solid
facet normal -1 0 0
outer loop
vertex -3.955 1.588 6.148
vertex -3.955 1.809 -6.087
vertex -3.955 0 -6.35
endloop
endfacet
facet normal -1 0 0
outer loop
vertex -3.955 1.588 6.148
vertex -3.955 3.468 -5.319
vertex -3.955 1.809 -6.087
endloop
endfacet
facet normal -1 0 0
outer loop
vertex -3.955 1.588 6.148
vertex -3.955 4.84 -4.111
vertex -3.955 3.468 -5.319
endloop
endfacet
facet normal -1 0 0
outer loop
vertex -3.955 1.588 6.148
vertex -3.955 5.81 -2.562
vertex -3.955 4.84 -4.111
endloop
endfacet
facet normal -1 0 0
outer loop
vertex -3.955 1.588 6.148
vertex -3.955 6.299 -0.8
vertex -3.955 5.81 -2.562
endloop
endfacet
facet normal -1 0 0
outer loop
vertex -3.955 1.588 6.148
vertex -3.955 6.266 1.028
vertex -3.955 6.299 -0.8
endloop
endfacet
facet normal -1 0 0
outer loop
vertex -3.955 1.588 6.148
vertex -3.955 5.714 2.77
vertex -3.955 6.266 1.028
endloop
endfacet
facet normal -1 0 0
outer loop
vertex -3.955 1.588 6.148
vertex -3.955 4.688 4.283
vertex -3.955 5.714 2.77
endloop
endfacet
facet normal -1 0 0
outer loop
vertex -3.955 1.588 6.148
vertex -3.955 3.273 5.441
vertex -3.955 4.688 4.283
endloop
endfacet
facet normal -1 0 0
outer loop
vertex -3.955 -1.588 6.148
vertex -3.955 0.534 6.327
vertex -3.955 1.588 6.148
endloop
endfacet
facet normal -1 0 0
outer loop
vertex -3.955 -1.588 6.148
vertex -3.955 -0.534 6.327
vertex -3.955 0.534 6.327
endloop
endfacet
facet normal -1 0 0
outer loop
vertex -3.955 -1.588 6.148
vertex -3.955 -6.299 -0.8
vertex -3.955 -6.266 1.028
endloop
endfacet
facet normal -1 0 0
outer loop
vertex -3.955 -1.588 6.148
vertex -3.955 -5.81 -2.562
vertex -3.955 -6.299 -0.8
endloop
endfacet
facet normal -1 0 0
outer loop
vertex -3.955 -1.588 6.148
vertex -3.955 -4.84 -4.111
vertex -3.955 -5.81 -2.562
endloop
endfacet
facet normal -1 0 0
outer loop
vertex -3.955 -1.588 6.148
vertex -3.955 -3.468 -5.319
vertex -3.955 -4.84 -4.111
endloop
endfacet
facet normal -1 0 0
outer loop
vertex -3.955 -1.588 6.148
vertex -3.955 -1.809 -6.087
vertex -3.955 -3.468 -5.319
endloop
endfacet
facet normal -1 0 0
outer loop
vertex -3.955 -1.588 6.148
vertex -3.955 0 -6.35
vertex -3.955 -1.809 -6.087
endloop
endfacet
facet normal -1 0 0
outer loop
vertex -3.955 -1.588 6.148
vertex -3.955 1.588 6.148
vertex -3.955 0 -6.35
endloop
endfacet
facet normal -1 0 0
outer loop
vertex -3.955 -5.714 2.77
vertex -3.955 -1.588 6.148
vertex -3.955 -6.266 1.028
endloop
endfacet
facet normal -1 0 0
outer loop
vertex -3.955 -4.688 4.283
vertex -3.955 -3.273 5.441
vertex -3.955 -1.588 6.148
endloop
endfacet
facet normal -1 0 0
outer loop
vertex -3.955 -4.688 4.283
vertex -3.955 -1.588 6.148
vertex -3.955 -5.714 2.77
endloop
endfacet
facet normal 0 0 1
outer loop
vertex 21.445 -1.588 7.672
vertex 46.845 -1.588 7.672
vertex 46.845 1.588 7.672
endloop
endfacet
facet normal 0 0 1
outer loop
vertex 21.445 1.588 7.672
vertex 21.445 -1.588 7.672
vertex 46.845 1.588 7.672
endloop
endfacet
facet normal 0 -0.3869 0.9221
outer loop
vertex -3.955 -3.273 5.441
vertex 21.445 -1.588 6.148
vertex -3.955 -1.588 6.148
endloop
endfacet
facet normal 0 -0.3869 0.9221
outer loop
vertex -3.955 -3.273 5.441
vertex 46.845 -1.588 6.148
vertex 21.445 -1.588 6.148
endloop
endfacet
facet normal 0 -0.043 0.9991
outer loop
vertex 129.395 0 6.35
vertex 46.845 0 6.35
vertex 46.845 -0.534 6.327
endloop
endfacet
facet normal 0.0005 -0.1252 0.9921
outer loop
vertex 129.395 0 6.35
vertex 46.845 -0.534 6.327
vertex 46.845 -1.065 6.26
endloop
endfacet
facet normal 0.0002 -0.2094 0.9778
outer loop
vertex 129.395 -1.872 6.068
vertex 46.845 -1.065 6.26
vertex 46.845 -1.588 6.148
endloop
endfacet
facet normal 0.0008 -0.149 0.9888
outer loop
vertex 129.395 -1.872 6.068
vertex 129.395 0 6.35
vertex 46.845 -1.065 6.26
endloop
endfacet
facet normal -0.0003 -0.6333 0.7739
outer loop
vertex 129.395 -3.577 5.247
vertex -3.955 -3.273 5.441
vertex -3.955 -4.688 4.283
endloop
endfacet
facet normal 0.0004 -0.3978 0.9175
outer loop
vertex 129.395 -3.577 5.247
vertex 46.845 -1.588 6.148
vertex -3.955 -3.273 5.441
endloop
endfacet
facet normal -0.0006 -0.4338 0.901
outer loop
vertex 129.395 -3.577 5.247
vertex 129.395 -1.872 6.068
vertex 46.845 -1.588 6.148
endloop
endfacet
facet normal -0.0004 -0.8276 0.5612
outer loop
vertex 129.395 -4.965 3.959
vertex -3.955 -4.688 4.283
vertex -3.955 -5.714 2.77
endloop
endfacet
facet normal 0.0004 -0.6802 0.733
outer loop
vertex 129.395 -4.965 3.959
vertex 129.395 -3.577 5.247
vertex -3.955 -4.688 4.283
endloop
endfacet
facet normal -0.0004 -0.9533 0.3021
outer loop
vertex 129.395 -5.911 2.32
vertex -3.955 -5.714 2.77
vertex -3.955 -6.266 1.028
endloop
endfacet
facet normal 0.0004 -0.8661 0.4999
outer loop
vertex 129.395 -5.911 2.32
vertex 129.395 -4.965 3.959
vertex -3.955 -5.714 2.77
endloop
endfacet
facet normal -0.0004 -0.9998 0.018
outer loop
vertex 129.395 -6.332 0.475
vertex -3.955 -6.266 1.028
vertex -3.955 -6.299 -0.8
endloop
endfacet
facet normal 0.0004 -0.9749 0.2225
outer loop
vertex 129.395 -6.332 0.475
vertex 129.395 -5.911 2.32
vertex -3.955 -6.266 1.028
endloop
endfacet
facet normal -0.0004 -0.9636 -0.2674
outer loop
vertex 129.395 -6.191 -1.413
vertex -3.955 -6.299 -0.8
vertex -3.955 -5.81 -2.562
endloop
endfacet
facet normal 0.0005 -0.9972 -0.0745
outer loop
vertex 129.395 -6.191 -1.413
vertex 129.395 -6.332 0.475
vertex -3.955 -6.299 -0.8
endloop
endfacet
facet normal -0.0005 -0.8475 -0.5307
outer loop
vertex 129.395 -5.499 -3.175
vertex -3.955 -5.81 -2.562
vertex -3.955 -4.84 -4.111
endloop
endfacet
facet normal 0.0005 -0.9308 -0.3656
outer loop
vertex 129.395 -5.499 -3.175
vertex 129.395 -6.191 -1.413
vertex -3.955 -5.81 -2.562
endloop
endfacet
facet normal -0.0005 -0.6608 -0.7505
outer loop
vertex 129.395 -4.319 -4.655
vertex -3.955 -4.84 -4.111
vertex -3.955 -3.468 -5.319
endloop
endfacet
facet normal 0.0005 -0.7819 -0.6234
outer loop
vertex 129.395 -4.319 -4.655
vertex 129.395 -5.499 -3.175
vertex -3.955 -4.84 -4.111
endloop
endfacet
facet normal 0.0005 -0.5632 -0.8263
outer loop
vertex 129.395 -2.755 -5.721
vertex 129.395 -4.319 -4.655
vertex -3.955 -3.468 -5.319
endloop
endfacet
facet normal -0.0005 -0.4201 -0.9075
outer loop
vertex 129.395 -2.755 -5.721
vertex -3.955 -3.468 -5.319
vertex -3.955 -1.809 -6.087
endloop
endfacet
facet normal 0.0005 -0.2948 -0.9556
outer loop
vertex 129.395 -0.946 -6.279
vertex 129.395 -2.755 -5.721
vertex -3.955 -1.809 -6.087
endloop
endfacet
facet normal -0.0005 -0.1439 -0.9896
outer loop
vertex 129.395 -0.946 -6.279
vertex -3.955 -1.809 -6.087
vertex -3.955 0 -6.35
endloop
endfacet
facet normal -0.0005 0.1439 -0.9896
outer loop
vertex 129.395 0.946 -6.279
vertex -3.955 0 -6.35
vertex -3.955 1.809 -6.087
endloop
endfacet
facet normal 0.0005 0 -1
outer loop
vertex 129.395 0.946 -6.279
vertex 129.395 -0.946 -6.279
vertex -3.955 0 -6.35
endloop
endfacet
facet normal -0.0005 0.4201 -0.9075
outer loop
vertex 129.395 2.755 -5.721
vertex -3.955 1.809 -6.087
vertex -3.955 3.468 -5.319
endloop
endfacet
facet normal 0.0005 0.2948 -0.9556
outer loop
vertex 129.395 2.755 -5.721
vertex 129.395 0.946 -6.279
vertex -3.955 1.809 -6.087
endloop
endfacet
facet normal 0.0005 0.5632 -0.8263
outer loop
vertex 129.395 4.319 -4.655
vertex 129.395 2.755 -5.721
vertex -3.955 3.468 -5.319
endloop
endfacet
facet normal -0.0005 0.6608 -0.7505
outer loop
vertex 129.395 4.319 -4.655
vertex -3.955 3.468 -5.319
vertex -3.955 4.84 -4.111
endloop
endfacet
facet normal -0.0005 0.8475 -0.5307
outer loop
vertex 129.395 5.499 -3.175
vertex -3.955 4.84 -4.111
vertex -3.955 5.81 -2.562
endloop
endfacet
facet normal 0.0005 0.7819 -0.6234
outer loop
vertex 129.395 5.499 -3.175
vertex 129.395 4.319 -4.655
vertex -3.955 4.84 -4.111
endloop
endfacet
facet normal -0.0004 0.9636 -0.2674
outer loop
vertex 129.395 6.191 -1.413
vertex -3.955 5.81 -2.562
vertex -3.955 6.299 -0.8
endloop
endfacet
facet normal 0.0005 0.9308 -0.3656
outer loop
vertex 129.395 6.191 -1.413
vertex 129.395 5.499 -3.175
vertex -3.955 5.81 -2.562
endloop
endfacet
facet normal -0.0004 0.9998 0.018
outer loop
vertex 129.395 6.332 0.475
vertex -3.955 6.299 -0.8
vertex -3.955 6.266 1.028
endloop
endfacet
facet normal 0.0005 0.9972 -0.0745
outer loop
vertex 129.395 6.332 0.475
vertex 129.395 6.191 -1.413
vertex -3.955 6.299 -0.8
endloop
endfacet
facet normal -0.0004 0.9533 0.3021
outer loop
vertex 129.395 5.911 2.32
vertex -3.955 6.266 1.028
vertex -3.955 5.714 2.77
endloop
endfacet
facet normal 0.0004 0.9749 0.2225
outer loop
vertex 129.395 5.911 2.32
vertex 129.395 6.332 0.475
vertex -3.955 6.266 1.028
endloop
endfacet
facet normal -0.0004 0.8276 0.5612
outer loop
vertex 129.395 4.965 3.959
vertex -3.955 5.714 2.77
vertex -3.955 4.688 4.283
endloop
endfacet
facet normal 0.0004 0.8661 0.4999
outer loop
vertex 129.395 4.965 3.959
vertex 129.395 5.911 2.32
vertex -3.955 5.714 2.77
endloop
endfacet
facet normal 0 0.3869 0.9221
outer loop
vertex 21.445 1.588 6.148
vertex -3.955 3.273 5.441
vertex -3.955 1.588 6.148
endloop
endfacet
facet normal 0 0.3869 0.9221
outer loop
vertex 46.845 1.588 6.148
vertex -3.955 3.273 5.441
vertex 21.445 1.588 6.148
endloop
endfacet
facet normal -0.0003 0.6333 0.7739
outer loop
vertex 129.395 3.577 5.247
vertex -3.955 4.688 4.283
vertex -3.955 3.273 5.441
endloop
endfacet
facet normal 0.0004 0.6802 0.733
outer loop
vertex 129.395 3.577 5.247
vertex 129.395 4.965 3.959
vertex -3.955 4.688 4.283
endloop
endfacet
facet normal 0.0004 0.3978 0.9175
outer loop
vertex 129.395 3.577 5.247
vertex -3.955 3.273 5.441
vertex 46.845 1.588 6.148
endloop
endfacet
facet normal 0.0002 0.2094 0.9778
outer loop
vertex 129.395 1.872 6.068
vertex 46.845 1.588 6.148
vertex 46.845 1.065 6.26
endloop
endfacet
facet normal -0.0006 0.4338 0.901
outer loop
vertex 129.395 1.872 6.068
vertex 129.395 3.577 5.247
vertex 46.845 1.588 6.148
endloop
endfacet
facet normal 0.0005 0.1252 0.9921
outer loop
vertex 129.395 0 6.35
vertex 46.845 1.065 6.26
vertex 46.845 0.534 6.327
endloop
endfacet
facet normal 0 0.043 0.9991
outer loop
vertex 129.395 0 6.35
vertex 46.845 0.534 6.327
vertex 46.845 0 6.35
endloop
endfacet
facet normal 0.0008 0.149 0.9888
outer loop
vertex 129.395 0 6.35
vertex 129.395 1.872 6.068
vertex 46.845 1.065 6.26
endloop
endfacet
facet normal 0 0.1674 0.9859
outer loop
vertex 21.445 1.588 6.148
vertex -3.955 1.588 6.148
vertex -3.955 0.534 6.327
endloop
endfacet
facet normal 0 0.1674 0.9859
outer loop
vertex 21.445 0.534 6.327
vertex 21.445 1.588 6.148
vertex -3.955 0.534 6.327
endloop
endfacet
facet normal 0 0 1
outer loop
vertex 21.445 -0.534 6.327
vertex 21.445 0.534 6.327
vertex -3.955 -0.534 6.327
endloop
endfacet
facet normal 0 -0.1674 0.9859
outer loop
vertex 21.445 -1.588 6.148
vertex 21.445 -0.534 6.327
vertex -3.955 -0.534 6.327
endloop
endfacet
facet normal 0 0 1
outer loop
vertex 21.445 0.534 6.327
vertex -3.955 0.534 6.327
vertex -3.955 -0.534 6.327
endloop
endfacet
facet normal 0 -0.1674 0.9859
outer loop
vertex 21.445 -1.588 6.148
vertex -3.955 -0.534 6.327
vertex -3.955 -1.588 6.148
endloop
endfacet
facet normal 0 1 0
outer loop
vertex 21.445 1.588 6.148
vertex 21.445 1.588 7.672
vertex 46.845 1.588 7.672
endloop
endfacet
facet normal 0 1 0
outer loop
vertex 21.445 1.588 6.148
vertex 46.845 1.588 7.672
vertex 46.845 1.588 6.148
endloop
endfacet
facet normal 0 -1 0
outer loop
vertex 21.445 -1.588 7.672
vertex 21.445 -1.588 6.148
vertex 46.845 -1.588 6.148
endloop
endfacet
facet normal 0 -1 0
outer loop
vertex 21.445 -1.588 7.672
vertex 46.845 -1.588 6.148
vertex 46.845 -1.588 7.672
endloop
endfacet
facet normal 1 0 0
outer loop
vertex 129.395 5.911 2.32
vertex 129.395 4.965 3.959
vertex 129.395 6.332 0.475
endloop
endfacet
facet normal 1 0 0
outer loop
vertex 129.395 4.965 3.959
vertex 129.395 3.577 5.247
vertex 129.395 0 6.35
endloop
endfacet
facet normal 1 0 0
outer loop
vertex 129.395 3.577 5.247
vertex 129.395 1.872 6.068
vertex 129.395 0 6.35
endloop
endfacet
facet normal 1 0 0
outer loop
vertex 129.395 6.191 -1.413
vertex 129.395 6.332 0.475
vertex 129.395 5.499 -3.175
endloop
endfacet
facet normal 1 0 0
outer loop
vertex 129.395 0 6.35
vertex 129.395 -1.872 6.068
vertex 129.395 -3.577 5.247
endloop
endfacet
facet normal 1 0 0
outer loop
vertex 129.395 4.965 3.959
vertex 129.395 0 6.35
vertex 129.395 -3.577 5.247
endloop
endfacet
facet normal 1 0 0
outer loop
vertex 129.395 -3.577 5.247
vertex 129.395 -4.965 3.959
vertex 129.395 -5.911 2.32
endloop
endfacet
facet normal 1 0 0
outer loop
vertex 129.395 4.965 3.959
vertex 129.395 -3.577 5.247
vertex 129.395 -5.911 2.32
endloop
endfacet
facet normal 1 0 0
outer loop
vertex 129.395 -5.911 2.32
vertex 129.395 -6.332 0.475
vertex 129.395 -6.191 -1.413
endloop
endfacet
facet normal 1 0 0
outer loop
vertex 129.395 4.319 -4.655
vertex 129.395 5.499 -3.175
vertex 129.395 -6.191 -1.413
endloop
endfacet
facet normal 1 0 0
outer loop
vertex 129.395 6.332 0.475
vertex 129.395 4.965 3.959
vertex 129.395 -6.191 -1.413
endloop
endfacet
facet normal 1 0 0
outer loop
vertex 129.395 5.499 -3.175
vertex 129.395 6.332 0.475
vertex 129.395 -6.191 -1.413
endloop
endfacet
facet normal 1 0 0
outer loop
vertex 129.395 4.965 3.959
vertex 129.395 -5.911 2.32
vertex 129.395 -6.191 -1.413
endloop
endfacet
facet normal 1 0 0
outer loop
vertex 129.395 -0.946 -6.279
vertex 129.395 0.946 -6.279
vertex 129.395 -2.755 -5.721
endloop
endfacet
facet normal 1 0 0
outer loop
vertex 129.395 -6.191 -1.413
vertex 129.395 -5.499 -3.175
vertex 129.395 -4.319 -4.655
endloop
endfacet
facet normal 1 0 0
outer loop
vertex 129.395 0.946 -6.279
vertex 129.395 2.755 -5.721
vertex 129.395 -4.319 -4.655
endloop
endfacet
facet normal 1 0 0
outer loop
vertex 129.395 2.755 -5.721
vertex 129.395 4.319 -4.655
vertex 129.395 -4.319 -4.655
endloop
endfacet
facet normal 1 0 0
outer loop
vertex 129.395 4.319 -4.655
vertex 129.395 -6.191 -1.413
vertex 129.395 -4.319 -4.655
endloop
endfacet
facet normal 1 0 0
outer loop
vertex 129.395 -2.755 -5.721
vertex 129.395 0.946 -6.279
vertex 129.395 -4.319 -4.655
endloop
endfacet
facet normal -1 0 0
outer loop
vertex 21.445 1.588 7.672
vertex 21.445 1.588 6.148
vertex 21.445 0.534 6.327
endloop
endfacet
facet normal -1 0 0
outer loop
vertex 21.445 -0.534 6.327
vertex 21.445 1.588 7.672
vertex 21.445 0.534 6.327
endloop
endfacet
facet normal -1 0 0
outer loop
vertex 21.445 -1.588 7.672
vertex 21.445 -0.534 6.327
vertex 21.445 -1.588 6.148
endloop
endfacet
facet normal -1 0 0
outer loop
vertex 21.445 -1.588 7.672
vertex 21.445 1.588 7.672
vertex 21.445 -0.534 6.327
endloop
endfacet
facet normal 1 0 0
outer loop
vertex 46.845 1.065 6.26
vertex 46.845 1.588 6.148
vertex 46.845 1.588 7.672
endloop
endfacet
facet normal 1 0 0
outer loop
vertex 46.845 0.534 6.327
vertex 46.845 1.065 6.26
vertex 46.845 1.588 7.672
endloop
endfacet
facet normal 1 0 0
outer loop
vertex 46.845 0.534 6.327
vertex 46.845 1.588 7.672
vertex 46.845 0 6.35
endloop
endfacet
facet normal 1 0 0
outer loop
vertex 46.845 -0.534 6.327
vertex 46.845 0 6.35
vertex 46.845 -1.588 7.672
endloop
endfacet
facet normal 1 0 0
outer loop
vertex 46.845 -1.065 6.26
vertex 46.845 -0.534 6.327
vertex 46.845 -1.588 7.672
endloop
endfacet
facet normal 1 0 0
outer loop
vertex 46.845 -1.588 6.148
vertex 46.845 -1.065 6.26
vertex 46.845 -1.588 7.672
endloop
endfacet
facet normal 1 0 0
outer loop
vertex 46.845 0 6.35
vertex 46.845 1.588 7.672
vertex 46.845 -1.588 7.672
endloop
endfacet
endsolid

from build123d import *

# Parameters (mm, degrees)
F0_W     = 133.35
F0_H     = 6.35
F3_DEPTH = 50.8
F5_DEPTH = 25.4


with BuildPart() as f1:
    # F0 (on Front) → F1 (revolve)
    with BuildSketch(Plane.XZ):
        with Locations((62.719703, 3.175)):
            Rectangle(F0_W, F0_H)
    revolve(axis=Axis((62.719703, 0, 0), (1, 0, 0)))

    # F2 (on face) → F3 (join)
    with BuildSketch(Plane(origin=(-3.955297, 0, 0), x_dir=(0, -1, 0), z_dir=(-1, 0, 0))):
        with BuildLine():
            Line((-1.5875, 7.672361), (-1.5875, 6.148361))
            ThreePointArc((-1.5875, 6.148361), (0, 6.35), (1.5875, 6.148361))
            Line((1.5875, 6.148361), (1.5875, 7.672361))
            Line((1.5875, 7.672361), (-1.5875, 7.672361))
        make_face()
    extrude(amount=-F3_DEPTH)

    # F4 (on face) → F5 (cut)
    with BuildSketch(Plane(origin=(-3.955297, 0, 0), x_dir=(0, -1, 0), z_dir=(-1, 0, 0))):
        with BuildLine():
            ThreePointArc((-1.5875, 6.148361), (0, 6.35), (1.5875, 6.148361))
            Line((1.5875, 6.148361), (1.5875, 7.672361))
            Line((1.5875, 7.672361), (-1.5875, 7.672361))
            Line((-1.5875, 7.672361), (-1.5875, 6.148361))
        make_face()
    extrude(amount=-F5_DEPTH, mode=Mode.SUBTRACT)


solid = f1.part
